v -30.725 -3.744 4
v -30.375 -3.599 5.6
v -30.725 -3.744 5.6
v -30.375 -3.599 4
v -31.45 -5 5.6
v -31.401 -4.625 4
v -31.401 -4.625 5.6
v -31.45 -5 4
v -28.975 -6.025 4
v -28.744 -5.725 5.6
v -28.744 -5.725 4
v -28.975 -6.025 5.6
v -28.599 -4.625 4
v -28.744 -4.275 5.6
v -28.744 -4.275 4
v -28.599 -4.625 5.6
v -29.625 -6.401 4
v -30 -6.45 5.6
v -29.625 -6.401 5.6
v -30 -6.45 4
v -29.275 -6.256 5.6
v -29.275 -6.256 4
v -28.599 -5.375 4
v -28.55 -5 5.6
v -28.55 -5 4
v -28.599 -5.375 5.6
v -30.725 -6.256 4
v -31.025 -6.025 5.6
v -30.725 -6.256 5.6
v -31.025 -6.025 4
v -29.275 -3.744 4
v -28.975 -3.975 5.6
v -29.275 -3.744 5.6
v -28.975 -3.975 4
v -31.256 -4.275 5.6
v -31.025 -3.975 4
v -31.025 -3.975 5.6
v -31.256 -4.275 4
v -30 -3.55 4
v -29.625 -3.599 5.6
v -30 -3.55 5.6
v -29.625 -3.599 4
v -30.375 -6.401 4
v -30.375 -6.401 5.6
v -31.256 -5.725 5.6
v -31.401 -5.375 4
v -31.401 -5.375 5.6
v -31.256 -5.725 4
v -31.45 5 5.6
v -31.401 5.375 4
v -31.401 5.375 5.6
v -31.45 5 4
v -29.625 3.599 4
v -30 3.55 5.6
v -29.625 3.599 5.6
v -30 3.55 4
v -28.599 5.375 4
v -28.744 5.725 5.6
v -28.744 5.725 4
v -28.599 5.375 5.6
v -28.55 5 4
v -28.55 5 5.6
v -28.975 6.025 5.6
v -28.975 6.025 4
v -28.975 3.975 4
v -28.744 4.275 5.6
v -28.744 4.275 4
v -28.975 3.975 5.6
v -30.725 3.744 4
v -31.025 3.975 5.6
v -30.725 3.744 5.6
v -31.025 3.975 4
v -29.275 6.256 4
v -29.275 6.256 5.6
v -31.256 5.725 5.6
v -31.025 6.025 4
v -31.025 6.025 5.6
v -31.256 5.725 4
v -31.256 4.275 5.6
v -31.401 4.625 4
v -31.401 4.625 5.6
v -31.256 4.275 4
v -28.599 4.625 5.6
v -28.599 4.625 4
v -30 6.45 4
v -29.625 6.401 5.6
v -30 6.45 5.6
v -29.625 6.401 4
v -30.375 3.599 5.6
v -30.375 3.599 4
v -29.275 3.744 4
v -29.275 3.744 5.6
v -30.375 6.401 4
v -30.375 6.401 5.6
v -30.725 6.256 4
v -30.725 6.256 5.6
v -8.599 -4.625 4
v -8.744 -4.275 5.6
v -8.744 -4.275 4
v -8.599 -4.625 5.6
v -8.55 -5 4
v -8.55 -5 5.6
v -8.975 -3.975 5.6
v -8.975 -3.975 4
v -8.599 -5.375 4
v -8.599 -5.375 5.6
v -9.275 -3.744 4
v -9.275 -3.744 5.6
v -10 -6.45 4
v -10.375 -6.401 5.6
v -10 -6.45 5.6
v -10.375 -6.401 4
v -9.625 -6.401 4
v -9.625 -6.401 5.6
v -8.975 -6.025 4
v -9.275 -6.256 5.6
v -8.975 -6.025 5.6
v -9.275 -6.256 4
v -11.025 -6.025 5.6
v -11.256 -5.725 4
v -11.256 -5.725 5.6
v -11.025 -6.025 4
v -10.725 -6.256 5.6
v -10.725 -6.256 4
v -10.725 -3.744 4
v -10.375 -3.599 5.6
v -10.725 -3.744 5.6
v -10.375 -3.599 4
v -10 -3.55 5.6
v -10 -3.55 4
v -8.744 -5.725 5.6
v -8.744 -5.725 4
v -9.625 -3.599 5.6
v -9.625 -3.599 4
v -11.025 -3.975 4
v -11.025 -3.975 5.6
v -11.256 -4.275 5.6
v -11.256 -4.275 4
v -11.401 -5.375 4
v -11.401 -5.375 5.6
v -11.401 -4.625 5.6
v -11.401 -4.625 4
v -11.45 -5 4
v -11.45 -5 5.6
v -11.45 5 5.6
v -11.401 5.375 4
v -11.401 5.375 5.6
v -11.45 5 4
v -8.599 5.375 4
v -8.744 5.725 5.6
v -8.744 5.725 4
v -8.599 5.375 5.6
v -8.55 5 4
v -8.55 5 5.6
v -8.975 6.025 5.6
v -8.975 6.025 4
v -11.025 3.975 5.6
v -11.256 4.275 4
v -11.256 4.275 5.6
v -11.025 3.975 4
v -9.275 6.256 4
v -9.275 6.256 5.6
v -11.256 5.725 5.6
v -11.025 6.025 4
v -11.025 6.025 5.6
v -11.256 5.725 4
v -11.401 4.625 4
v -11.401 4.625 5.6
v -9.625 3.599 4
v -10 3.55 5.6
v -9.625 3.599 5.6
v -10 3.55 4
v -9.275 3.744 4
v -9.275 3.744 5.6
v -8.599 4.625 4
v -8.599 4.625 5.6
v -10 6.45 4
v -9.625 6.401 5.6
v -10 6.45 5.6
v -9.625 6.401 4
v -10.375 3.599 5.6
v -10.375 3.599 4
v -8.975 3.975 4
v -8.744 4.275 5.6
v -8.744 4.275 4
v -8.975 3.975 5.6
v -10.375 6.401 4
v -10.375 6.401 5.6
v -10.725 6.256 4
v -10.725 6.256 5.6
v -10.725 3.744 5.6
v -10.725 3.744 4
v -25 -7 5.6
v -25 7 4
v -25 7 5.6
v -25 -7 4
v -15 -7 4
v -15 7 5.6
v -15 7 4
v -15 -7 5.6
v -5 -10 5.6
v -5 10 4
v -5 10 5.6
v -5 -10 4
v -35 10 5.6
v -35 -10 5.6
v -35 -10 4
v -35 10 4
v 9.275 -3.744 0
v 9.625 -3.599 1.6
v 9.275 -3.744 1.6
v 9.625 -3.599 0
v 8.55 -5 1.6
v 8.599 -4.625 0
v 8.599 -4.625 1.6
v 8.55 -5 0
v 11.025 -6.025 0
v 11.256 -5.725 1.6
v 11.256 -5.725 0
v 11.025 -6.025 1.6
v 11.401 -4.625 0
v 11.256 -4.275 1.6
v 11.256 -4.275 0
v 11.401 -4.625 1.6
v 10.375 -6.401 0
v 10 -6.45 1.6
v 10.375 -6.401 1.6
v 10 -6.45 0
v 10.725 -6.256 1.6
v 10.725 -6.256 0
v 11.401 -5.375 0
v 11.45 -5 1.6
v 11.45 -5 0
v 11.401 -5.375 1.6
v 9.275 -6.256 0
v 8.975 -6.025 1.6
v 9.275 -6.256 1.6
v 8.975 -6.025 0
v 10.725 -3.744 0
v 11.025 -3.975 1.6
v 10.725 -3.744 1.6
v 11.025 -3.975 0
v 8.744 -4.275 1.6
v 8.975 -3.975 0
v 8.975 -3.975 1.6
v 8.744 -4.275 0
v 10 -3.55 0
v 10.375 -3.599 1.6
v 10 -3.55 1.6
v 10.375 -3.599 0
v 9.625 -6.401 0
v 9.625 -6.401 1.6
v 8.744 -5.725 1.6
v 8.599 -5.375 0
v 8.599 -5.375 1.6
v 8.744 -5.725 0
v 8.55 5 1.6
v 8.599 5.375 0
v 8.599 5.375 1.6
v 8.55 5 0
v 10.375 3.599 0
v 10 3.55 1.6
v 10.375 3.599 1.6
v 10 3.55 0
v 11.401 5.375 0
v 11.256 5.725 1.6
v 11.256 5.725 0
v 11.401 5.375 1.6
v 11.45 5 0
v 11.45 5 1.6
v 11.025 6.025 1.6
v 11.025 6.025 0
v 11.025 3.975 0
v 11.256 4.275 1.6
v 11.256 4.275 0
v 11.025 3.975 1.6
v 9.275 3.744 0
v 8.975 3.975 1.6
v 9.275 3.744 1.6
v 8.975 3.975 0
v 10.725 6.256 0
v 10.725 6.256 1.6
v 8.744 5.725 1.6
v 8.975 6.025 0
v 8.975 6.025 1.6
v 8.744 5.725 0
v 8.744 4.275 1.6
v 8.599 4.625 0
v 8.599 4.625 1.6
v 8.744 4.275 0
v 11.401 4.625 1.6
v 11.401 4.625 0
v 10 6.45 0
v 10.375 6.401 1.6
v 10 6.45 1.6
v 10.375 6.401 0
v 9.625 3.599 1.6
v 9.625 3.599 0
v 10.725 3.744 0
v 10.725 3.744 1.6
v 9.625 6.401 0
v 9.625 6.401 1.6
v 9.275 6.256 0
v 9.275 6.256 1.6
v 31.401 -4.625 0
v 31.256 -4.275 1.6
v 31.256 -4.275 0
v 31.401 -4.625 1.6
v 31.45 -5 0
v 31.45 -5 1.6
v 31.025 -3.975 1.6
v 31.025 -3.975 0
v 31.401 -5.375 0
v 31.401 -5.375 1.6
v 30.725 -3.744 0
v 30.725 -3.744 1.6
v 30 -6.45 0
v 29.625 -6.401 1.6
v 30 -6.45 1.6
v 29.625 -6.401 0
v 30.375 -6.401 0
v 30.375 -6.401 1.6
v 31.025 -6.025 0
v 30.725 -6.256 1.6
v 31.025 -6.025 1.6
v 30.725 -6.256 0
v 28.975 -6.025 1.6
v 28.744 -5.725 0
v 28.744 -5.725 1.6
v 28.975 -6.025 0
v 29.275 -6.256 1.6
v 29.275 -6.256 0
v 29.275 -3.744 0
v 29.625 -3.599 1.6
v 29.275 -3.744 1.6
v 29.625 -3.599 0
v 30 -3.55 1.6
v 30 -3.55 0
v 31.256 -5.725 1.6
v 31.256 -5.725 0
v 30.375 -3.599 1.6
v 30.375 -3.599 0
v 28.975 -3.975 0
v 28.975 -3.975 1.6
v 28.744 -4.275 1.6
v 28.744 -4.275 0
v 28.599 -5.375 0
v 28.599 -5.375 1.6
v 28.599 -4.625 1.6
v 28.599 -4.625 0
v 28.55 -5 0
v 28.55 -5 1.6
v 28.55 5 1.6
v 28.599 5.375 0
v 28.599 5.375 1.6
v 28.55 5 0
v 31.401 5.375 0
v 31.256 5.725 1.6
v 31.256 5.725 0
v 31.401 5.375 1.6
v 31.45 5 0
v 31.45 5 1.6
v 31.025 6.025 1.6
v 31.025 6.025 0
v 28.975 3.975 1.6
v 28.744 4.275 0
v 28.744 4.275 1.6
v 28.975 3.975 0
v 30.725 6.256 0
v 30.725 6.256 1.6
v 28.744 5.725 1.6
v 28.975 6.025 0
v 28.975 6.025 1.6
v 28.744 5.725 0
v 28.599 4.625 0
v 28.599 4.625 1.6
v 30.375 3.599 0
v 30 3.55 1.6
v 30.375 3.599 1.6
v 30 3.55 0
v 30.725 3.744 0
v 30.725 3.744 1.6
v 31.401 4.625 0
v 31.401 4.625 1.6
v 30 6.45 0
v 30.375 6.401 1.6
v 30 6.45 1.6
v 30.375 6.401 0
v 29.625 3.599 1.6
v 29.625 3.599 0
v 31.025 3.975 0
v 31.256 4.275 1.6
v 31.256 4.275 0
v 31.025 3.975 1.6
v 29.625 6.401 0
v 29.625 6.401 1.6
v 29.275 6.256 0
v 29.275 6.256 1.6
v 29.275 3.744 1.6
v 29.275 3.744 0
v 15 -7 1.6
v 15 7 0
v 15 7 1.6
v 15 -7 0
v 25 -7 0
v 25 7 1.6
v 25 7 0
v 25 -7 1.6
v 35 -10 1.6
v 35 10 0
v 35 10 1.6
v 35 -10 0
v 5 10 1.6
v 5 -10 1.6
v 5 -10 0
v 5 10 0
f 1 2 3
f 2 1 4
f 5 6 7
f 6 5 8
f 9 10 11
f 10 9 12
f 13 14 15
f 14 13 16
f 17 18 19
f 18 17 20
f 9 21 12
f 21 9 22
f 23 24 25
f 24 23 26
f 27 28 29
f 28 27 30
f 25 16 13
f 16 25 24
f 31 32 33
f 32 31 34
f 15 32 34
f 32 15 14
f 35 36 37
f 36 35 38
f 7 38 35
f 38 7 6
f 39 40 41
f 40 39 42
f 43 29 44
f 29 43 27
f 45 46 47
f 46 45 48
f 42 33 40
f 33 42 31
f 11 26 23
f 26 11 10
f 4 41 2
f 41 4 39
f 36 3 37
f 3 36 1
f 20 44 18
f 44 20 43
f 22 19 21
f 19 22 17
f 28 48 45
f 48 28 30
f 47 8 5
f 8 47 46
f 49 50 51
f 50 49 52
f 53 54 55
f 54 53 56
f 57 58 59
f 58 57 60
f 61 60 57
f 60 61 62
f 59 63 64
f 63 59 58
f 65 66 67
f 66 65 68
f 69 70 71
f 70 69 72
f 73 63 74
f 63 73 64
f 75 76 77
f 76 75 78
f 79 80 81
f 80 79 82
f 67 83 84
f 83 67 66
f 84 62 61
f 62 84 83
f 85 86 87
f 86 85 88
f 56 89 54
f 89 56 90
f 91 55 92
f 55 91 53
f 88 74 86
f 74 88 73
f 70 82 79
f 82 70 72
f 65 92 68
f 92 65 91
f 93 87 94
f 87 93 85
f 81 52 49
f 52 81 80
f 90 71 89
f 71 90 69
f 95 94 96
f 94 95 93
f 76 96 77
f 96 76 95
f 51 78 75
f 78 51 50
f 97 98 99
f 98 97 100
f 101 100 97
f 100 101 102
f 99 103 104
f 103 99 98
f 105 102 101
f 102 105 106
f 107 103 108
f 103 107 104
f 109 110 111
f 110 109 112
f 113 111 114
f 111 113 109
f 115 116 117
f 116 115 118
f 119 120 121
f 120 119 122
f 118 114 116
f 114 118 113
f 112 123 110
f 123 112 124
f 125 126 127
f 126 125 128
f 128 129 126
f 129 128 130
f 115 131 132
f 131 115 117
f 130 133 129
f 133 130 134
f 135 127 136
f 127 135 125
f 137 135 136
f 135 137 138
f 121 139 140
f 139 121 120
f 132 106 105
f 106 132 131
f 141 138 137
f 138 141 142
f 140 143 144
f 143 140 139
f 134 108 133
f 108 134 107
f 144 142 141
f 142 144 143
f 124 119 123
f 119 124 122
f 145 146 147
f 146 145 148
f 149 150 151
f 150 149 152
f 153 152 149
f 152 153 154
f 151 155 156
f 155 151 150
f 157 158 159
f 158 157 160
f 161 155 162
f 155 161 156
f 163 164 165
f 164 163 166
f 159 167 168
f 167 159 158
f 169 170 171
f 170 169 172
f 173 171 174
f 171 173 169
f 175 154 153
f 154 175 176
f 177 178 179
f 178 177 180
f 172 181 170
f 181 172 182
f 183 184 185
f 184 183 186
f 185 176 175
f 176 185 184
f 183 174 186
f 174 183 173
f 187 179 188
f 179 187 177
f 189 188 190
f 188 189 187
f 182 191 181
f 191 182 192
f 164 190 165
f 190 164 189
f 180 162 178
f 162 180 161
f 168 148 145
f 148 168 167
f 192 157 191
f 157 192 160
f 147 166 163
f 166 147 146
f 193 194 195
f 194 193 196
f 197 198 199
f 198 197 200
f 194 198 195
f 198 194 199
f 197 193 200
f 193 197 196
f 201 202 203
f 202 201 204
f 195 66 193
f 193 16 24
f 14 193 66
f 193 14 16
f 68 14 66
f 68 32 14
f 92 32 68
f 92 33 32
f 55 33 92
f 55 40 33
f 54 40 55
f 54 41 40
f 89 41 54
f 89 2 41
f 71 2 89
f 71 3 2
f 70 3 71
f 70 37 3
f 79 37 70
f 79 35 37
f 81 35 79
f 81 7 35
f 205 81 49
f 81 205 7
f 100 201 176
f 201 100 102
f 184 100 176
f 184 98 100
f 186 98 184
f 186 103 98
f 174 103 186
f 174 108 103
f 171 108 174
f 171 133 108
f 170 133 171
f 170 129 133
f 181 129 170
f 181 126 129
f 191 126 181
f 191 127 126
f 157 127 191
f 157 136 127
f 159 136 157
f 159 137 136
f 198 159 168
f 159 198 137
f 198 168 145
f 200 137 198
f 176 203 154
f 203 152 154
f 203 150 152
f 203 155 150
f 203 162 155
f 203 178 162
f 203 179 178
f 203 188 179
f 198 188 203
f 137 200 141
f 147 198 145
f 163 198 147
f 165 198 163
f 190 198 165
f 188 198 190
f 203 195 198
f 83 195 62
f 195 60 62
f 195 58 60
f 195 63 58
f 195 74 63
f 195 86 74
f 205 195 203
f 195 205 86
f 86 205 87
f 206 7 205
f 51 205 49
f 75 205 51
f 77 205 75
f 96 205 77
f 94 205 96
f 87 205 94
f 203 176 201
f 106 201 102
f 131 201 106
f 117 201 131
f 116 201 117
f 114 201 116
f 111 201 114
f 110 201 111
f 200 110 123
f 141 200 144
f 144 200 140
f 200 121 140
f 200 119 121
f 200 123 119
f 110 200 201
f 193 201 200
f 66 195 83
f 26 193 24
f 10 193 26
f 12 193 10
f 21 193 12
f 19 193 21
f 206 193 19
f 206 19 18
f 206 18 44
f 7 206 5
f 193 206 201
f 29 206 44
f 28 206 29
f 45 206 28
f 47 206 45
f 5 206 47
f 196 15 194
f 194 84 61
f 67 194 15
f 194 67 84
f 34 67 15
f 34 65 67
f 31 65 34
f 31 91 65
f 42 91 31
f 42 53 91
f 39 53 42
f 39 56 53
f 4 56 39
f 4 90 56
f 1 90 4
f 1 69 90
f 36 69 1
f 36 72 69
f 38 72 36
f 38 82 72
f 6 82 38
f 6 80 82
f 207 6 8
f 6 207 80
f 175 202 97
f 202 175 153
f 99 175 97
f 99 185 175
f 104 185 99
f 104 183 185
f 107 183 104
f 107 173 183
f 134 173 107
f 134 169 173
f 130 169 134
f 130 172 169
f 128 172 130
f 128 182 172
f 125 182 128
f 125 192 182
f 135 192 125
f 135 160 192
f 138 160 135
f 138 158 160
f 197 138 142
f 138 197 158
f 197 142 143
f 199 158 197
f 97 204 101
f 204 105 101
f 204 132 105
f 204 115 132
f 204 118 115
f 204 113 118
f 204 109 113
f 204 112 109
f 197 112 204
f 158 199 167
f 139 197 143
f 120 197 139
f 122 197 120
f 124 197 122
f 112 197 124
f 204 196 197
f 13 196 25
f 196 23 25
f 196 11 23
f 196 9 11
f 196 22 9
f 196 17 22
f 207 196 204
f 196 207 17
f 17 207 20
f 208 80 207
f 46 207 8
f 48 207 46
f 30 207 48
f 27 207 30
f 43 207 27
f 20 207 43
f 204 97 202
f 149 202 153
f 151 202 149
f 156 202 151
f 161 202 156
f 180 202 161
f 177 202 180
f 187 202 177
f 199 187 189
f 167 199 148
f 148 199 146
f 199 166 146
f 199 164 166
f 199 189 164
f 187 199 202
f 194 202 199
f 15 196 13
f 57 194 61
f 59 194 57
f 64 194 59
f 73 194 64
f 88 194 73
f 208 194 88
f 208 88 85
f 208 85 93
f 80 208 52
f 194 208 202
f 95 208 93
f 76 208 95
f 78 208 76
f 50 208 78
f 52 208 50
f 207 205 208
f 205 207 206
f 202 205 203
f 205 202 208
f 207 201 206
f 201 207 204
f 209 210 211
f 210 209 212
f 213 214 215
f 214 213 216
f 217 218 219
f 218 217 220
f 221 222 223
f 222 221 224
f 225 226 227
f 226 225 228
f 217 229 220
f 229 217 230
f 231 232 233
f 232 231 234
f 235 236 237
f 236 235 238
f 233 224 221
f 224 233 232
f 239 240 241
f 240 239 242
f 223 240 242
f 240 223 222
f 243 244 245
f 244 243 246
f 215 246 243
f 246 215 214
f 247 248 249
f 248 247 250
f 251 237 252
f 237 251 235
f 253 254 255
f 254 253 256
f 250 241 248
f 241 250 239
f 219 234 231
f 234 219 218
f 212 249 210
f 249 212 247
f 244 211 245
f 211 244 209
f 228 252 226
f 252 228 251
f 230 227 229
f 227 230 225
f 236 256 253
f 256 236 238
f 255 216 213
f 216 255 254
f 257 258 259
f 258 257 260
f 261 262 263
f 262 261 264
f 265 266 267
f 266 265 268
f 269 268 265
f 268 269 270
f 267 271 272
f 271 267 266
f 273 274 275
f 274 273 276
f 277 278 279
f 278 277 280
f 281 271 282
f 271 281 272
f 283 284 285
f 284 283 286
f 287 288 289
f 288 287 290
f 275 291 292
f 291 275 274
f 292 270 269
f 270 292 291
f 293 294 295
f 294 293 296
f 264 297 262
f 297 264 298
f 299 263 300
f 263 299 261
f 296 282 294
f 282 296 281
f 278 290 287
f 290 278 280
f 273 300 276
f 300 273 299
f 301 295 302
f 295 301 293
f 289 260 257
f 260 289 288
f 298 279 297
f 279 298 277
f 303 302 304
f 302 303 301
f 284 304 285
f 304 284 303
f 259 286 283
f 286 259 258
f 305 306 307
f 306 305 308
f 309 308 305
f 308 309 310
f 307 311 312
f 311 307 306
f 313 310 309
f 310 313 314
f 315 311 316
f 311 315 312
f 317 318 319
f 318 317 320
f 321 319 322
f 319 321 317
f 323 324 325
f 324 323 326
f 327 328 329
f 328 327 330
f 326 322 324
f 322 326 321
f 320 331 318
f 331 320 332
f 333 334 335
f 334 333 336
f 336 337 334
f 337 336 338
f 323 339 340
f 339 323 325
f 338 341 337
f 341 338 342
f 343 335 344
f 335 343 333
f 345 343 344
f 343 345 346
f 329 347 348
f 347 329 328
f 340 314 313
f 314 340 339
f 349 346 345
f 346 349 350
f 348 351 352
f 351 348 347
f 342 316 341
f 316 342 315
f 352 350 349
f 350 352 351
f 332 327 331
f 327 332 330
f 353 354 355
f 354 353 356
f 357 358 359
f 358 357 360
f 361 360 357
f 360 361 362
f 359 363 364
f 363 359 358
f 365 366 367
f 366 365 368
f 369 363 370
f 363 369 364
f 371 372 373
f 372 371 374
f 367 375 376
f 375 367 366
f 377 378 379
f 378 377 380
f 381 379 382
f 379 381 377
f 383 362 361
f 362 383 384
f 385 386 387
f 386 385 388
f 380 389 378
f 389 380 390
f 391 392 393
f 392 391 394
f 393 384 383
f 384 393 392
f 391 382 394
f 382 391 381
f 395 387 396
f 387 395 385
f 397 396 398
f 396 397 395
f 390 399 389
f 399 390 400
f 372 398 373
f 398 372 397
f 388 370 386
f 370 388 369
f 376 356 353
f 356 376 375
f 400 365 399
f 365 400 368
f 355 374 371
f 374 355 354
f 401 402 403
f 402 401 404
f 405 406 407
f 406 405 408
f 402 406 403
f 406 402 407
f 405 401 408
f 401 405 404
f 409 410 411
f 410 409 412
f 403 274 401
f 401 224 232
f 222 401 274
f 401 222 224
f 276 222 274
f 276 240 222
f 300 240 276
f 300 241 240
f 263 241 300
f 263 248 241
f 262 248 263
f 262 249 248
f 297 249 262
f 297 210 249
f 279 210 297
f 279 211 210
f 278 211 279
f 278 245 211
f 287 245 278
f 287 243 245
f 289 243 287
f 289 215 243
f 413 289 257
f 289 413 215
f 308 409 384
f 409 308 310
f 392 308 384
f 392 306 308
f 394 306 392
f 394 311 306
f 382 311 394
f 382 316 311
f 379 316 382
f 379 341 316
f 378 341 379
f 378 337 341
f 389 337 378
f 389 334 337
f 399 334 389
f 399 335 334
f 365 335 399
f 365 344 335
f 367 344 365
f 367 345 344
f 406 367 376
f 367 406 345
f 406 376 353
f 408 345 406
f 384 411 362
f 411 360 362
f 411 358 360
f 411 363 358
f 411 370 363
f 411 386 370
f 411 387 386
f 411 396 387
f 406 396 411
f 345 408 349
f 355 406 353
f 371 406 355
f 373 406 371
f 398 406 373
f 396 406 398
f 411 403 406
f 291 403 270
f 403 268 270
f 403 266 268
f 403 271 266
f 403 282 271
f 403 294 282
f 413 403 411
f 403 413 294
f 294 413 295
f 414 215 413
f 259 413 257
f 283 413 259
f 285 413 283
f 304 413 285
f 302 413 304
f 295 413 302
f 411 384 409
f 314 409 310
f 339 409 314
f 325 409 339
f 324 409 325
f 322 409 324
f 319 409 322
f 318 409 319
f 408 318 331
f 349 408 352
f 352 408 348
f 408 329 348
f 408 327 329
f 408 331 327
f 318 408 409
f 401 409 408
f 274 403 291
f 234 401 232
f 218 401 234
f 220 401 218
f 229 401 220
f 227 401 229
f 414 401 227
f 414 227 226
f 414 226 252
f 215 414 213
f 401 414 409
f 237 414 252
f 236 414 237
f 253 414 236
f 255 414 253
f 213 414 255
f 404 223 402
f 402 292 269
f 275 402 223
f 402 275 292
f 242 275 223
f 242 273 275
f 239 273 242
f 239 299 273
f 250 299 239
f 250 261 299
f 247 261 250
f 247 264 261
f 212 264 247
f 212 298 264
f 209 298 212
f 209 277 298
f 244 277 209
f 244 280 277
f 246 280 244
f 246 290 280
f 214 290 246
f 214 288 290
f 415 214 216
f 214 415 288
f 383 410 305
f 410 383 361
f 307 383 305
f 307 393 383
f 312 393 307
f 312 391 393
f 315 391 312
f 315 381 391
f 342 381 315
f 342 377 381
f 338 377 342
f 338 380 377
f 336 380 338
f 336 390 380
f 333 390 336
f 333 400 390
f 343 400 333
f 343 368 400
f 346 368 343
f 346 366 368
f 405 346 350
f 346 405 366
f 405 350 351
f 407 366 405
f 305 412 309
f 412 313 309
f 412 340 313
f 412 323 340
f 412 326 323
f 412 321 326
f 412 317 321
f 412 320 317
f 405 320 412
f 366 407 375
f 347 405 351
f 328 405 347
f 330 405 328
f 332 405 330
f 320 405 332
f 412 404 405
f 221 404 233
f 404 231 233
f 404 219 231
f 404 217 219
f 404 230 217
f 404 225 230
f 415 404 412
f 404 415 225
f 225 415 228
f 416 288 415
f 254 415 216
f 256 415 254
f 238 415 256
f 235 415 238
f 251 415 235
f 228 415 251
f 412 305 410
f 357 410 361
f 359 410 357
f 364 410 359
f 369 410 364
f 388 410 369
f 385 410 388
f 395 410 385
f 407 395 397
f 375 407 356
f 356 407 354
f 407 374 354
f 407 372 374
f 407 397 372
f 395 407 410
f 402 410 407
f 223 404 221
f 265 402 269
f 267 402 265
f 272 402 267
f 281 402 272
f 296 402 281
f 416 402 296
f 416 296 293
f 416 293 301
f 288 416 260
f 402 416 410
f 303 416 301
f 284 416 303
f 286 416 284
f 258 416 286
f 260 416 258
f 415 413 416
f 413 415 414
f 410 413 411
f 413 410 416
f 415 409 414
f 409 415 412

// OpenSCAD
// file: ../../screw-post/screw-post.scad
//-----------------------------------------------------------------------
// Screw post: a round post off the floor that a board screws down onto
//
// Two ways to fix:
//   "nut"  clearance hole through the post and floor; the nut sits in a hex
//          trap in the floor's underside, so the screw goes in from the top
//   "tap"  a pilot hole the screw cuts its own thread in (one or two fittings
//          in PLA/PETG); blind, the floor stays whole underneath
// and "head" for a screw up from below (head in a counterbore, nut on top).
//
// Modules, all in the same frame:
//   screwPostGhost()     the screw (and nut), for previews
//   screwPost()          the post: add to the floor
//   screwPostFloorCut()  subtract from the floor: nut trap / counterbore and hole
//
// Frame: origin on the floor top, on the post's axis. Z up; the floor is
// Z = -floorThick .. 0. Units: mm.
//
// Sizes: "M2", "M2.5", "M3". screwPostScrew(size, ...) says which screw length
// reaches, so a project can assert it has that screw in the kit.
//-----------------------------------------------------------------------

//-- [name, screw Ø, nut across flats, nut thick, head Ø, head height, tap hole, post Ø]
//-- Nuts ISO 4032; heads ISO 7380 button. Tap holes: the usual ~0.8 x Ø for plastic
screwSizes = [
  ["M2",   2.0, 4.0, 1.6, 3.5, 1.1, 1.6, 5.0],
  ["M2.5", 2.5, 5.0, 2.0, 4.4, 1.4, 2.1, 6.0],    // head 4.4: measured on the kit's M2.5 (controller base)
  ["M3",   3.0, 5.5, 2.4, 5.7, 1.65, 2.5, 7.0],
];

screwHoleClear = 0.4;     // added to the screw Ø for a clearance hole
screwNutClear  = 0.3;     // CAL: across flats, nut trap over the nut. Set by the fit piece
screwTapClear  = 0.0;     // CAL: added to the tap hole. Set by the fit piece
screwHeadClear = 0.6;     // counterbore over the head Ø

function screwSize(size) = let (i = search([size], screwSizes)[0])
  assert(i != [] && i != undef, str("unknown screw size ", size)) screwSizes[i];
function screwDia(size)    = screwSize(size)[1];
function screwNutAF(size)  = screwSize(size)[2];
function screwNutH(size)   = screwSize(size)[3];
function screwHeadDia(size)= screwSize(size)[4];
function screwHeadH(size)  = screwSize(size)[5];
function screwPostDia(size)= screwSize(size)[7];

//-- Shortest screw that fills the nut, from the top of the clamped part (h + clamp
//-- above the floor) down to the nut trap's underside. Round up to a length you have.
function screwPostScrew(size, h, floorThick, clamp = 1.6) = h + clamp + floorThick;

module screwPostGhost(size, h, floorThick, clamp = 1.6, length, how = "nut")
{
  d = screwDia(size);
  L = is_undef(length) ? screwPostScrew(size, h, floorThick, clamp) : length;
  top = h + clamp;
  if (how == "head")
  {
    %color("Silver") translate([0, 0, -floorThick]) cylinder(d = screwHeadDia(size), h = screwHeadH(size), $fn = 24);
    %color("Silver") translate([0, 0, -floorThick + screwHeadH(size)]) cylinder(d = d, h = L, $fn = 16);
  }
  else
  {
    %color("Silver") translate([0, 0, top]) cylinder(d = screwHeadDia(size), h = screwHeadH(size), $fn = 24);
    %color("Silver") translate([0, 0, top - L]) cylinder(d = d, h = L, $fn = 16);
    if (how == "nut")
      %color("DimGray") translate([0, 0, -floorThick]) rotate([0, 0, 30]) cylinder(d = screwNutAF(size)/cos(30), h = screwNutH(size), $fn = 6);
  }
}

//-- how: "nut" | "head" (through hole) or "tap" (blind pilot hole). postDia defaults by size
module screwPost(size, h, how = "nut", postDia, tapClear = screwTapClear)
{
  pd = is_undef(postDia) ? screwPostDia(size) : postDia;
  hole = how == "tap" ? screwSize(size)[6] + tapClear : screwDia(size) + screwHoleClear;
  difference()
  {
    translate([0, 0, -0.01]) cylinder(d = pd, h = h + 0.01, $fn = 40);
    translate([0, 0, how == "tap" ? 0.6 : -1]) cylinder(d = hole, h = h + 2, $fn = 24);
    //-- lead-in so the screw starts square
    translate([0, 0, h - 0.4]) cylinder(d1 = hole, d2 = hole + 0.8, h = 0.41, $fn = 24);
  }
}

//-- "nut": hex trap from the underside, opening a little over the nut so it sits flush.
//-- "head": counterbore for the head. "tap": nothing.
module screwPostFloorCut(size, floorThick, how = "nut", nutClear = screwNutClear)
{
  d = screwDia(size) + screwHoleClear;
  if (how == "nut")
  {
    af = screwNutAF(size) + nutClear;
    translate([0, 0, -floorThick - 1]) rotate([0, 0, 30]) cylinder(d = af/cos(30), h = screwNutH(size) + 0.1 + 1, $fn = 6);
    translate([0, 0, -floorThick - 1]) cylinder(d = d + 0.4, h = floorThick + 2, $fn = 24);
  }
  if (how == "head")
  {
    translate([0, 0, -floorThick - 1]) cylinder(d = screwHeadDia(size) + screwHeadClear, h = screwHeadH(size) + 0.2 + 1, $fn = 32);
    translate([0, 0, -floorThick - 1]) cylinder(d = d + 0.4, h = floorThick + 2, $fn = 24);
  }
  assert(how == "tap" || floorThick >= (how == "nut" ? screwNutH(size) : screwHeadH(size)) + 0.1 + 0.3,
         str("floor too thin for the ", size, " ", how));
}
// main file
// The two 3 x 2 carriers of floor.scad, seated: on the bosses at the left, flat at the right.
use <../carrier.scad>

nx = 3; ny = 2;

translate([-20, 0, crSeatZ("tap")]) carrierPlate(nx, ny);
translate([20, 0, crSeatZ("nut")]) carrierPlate(nx, ny);
